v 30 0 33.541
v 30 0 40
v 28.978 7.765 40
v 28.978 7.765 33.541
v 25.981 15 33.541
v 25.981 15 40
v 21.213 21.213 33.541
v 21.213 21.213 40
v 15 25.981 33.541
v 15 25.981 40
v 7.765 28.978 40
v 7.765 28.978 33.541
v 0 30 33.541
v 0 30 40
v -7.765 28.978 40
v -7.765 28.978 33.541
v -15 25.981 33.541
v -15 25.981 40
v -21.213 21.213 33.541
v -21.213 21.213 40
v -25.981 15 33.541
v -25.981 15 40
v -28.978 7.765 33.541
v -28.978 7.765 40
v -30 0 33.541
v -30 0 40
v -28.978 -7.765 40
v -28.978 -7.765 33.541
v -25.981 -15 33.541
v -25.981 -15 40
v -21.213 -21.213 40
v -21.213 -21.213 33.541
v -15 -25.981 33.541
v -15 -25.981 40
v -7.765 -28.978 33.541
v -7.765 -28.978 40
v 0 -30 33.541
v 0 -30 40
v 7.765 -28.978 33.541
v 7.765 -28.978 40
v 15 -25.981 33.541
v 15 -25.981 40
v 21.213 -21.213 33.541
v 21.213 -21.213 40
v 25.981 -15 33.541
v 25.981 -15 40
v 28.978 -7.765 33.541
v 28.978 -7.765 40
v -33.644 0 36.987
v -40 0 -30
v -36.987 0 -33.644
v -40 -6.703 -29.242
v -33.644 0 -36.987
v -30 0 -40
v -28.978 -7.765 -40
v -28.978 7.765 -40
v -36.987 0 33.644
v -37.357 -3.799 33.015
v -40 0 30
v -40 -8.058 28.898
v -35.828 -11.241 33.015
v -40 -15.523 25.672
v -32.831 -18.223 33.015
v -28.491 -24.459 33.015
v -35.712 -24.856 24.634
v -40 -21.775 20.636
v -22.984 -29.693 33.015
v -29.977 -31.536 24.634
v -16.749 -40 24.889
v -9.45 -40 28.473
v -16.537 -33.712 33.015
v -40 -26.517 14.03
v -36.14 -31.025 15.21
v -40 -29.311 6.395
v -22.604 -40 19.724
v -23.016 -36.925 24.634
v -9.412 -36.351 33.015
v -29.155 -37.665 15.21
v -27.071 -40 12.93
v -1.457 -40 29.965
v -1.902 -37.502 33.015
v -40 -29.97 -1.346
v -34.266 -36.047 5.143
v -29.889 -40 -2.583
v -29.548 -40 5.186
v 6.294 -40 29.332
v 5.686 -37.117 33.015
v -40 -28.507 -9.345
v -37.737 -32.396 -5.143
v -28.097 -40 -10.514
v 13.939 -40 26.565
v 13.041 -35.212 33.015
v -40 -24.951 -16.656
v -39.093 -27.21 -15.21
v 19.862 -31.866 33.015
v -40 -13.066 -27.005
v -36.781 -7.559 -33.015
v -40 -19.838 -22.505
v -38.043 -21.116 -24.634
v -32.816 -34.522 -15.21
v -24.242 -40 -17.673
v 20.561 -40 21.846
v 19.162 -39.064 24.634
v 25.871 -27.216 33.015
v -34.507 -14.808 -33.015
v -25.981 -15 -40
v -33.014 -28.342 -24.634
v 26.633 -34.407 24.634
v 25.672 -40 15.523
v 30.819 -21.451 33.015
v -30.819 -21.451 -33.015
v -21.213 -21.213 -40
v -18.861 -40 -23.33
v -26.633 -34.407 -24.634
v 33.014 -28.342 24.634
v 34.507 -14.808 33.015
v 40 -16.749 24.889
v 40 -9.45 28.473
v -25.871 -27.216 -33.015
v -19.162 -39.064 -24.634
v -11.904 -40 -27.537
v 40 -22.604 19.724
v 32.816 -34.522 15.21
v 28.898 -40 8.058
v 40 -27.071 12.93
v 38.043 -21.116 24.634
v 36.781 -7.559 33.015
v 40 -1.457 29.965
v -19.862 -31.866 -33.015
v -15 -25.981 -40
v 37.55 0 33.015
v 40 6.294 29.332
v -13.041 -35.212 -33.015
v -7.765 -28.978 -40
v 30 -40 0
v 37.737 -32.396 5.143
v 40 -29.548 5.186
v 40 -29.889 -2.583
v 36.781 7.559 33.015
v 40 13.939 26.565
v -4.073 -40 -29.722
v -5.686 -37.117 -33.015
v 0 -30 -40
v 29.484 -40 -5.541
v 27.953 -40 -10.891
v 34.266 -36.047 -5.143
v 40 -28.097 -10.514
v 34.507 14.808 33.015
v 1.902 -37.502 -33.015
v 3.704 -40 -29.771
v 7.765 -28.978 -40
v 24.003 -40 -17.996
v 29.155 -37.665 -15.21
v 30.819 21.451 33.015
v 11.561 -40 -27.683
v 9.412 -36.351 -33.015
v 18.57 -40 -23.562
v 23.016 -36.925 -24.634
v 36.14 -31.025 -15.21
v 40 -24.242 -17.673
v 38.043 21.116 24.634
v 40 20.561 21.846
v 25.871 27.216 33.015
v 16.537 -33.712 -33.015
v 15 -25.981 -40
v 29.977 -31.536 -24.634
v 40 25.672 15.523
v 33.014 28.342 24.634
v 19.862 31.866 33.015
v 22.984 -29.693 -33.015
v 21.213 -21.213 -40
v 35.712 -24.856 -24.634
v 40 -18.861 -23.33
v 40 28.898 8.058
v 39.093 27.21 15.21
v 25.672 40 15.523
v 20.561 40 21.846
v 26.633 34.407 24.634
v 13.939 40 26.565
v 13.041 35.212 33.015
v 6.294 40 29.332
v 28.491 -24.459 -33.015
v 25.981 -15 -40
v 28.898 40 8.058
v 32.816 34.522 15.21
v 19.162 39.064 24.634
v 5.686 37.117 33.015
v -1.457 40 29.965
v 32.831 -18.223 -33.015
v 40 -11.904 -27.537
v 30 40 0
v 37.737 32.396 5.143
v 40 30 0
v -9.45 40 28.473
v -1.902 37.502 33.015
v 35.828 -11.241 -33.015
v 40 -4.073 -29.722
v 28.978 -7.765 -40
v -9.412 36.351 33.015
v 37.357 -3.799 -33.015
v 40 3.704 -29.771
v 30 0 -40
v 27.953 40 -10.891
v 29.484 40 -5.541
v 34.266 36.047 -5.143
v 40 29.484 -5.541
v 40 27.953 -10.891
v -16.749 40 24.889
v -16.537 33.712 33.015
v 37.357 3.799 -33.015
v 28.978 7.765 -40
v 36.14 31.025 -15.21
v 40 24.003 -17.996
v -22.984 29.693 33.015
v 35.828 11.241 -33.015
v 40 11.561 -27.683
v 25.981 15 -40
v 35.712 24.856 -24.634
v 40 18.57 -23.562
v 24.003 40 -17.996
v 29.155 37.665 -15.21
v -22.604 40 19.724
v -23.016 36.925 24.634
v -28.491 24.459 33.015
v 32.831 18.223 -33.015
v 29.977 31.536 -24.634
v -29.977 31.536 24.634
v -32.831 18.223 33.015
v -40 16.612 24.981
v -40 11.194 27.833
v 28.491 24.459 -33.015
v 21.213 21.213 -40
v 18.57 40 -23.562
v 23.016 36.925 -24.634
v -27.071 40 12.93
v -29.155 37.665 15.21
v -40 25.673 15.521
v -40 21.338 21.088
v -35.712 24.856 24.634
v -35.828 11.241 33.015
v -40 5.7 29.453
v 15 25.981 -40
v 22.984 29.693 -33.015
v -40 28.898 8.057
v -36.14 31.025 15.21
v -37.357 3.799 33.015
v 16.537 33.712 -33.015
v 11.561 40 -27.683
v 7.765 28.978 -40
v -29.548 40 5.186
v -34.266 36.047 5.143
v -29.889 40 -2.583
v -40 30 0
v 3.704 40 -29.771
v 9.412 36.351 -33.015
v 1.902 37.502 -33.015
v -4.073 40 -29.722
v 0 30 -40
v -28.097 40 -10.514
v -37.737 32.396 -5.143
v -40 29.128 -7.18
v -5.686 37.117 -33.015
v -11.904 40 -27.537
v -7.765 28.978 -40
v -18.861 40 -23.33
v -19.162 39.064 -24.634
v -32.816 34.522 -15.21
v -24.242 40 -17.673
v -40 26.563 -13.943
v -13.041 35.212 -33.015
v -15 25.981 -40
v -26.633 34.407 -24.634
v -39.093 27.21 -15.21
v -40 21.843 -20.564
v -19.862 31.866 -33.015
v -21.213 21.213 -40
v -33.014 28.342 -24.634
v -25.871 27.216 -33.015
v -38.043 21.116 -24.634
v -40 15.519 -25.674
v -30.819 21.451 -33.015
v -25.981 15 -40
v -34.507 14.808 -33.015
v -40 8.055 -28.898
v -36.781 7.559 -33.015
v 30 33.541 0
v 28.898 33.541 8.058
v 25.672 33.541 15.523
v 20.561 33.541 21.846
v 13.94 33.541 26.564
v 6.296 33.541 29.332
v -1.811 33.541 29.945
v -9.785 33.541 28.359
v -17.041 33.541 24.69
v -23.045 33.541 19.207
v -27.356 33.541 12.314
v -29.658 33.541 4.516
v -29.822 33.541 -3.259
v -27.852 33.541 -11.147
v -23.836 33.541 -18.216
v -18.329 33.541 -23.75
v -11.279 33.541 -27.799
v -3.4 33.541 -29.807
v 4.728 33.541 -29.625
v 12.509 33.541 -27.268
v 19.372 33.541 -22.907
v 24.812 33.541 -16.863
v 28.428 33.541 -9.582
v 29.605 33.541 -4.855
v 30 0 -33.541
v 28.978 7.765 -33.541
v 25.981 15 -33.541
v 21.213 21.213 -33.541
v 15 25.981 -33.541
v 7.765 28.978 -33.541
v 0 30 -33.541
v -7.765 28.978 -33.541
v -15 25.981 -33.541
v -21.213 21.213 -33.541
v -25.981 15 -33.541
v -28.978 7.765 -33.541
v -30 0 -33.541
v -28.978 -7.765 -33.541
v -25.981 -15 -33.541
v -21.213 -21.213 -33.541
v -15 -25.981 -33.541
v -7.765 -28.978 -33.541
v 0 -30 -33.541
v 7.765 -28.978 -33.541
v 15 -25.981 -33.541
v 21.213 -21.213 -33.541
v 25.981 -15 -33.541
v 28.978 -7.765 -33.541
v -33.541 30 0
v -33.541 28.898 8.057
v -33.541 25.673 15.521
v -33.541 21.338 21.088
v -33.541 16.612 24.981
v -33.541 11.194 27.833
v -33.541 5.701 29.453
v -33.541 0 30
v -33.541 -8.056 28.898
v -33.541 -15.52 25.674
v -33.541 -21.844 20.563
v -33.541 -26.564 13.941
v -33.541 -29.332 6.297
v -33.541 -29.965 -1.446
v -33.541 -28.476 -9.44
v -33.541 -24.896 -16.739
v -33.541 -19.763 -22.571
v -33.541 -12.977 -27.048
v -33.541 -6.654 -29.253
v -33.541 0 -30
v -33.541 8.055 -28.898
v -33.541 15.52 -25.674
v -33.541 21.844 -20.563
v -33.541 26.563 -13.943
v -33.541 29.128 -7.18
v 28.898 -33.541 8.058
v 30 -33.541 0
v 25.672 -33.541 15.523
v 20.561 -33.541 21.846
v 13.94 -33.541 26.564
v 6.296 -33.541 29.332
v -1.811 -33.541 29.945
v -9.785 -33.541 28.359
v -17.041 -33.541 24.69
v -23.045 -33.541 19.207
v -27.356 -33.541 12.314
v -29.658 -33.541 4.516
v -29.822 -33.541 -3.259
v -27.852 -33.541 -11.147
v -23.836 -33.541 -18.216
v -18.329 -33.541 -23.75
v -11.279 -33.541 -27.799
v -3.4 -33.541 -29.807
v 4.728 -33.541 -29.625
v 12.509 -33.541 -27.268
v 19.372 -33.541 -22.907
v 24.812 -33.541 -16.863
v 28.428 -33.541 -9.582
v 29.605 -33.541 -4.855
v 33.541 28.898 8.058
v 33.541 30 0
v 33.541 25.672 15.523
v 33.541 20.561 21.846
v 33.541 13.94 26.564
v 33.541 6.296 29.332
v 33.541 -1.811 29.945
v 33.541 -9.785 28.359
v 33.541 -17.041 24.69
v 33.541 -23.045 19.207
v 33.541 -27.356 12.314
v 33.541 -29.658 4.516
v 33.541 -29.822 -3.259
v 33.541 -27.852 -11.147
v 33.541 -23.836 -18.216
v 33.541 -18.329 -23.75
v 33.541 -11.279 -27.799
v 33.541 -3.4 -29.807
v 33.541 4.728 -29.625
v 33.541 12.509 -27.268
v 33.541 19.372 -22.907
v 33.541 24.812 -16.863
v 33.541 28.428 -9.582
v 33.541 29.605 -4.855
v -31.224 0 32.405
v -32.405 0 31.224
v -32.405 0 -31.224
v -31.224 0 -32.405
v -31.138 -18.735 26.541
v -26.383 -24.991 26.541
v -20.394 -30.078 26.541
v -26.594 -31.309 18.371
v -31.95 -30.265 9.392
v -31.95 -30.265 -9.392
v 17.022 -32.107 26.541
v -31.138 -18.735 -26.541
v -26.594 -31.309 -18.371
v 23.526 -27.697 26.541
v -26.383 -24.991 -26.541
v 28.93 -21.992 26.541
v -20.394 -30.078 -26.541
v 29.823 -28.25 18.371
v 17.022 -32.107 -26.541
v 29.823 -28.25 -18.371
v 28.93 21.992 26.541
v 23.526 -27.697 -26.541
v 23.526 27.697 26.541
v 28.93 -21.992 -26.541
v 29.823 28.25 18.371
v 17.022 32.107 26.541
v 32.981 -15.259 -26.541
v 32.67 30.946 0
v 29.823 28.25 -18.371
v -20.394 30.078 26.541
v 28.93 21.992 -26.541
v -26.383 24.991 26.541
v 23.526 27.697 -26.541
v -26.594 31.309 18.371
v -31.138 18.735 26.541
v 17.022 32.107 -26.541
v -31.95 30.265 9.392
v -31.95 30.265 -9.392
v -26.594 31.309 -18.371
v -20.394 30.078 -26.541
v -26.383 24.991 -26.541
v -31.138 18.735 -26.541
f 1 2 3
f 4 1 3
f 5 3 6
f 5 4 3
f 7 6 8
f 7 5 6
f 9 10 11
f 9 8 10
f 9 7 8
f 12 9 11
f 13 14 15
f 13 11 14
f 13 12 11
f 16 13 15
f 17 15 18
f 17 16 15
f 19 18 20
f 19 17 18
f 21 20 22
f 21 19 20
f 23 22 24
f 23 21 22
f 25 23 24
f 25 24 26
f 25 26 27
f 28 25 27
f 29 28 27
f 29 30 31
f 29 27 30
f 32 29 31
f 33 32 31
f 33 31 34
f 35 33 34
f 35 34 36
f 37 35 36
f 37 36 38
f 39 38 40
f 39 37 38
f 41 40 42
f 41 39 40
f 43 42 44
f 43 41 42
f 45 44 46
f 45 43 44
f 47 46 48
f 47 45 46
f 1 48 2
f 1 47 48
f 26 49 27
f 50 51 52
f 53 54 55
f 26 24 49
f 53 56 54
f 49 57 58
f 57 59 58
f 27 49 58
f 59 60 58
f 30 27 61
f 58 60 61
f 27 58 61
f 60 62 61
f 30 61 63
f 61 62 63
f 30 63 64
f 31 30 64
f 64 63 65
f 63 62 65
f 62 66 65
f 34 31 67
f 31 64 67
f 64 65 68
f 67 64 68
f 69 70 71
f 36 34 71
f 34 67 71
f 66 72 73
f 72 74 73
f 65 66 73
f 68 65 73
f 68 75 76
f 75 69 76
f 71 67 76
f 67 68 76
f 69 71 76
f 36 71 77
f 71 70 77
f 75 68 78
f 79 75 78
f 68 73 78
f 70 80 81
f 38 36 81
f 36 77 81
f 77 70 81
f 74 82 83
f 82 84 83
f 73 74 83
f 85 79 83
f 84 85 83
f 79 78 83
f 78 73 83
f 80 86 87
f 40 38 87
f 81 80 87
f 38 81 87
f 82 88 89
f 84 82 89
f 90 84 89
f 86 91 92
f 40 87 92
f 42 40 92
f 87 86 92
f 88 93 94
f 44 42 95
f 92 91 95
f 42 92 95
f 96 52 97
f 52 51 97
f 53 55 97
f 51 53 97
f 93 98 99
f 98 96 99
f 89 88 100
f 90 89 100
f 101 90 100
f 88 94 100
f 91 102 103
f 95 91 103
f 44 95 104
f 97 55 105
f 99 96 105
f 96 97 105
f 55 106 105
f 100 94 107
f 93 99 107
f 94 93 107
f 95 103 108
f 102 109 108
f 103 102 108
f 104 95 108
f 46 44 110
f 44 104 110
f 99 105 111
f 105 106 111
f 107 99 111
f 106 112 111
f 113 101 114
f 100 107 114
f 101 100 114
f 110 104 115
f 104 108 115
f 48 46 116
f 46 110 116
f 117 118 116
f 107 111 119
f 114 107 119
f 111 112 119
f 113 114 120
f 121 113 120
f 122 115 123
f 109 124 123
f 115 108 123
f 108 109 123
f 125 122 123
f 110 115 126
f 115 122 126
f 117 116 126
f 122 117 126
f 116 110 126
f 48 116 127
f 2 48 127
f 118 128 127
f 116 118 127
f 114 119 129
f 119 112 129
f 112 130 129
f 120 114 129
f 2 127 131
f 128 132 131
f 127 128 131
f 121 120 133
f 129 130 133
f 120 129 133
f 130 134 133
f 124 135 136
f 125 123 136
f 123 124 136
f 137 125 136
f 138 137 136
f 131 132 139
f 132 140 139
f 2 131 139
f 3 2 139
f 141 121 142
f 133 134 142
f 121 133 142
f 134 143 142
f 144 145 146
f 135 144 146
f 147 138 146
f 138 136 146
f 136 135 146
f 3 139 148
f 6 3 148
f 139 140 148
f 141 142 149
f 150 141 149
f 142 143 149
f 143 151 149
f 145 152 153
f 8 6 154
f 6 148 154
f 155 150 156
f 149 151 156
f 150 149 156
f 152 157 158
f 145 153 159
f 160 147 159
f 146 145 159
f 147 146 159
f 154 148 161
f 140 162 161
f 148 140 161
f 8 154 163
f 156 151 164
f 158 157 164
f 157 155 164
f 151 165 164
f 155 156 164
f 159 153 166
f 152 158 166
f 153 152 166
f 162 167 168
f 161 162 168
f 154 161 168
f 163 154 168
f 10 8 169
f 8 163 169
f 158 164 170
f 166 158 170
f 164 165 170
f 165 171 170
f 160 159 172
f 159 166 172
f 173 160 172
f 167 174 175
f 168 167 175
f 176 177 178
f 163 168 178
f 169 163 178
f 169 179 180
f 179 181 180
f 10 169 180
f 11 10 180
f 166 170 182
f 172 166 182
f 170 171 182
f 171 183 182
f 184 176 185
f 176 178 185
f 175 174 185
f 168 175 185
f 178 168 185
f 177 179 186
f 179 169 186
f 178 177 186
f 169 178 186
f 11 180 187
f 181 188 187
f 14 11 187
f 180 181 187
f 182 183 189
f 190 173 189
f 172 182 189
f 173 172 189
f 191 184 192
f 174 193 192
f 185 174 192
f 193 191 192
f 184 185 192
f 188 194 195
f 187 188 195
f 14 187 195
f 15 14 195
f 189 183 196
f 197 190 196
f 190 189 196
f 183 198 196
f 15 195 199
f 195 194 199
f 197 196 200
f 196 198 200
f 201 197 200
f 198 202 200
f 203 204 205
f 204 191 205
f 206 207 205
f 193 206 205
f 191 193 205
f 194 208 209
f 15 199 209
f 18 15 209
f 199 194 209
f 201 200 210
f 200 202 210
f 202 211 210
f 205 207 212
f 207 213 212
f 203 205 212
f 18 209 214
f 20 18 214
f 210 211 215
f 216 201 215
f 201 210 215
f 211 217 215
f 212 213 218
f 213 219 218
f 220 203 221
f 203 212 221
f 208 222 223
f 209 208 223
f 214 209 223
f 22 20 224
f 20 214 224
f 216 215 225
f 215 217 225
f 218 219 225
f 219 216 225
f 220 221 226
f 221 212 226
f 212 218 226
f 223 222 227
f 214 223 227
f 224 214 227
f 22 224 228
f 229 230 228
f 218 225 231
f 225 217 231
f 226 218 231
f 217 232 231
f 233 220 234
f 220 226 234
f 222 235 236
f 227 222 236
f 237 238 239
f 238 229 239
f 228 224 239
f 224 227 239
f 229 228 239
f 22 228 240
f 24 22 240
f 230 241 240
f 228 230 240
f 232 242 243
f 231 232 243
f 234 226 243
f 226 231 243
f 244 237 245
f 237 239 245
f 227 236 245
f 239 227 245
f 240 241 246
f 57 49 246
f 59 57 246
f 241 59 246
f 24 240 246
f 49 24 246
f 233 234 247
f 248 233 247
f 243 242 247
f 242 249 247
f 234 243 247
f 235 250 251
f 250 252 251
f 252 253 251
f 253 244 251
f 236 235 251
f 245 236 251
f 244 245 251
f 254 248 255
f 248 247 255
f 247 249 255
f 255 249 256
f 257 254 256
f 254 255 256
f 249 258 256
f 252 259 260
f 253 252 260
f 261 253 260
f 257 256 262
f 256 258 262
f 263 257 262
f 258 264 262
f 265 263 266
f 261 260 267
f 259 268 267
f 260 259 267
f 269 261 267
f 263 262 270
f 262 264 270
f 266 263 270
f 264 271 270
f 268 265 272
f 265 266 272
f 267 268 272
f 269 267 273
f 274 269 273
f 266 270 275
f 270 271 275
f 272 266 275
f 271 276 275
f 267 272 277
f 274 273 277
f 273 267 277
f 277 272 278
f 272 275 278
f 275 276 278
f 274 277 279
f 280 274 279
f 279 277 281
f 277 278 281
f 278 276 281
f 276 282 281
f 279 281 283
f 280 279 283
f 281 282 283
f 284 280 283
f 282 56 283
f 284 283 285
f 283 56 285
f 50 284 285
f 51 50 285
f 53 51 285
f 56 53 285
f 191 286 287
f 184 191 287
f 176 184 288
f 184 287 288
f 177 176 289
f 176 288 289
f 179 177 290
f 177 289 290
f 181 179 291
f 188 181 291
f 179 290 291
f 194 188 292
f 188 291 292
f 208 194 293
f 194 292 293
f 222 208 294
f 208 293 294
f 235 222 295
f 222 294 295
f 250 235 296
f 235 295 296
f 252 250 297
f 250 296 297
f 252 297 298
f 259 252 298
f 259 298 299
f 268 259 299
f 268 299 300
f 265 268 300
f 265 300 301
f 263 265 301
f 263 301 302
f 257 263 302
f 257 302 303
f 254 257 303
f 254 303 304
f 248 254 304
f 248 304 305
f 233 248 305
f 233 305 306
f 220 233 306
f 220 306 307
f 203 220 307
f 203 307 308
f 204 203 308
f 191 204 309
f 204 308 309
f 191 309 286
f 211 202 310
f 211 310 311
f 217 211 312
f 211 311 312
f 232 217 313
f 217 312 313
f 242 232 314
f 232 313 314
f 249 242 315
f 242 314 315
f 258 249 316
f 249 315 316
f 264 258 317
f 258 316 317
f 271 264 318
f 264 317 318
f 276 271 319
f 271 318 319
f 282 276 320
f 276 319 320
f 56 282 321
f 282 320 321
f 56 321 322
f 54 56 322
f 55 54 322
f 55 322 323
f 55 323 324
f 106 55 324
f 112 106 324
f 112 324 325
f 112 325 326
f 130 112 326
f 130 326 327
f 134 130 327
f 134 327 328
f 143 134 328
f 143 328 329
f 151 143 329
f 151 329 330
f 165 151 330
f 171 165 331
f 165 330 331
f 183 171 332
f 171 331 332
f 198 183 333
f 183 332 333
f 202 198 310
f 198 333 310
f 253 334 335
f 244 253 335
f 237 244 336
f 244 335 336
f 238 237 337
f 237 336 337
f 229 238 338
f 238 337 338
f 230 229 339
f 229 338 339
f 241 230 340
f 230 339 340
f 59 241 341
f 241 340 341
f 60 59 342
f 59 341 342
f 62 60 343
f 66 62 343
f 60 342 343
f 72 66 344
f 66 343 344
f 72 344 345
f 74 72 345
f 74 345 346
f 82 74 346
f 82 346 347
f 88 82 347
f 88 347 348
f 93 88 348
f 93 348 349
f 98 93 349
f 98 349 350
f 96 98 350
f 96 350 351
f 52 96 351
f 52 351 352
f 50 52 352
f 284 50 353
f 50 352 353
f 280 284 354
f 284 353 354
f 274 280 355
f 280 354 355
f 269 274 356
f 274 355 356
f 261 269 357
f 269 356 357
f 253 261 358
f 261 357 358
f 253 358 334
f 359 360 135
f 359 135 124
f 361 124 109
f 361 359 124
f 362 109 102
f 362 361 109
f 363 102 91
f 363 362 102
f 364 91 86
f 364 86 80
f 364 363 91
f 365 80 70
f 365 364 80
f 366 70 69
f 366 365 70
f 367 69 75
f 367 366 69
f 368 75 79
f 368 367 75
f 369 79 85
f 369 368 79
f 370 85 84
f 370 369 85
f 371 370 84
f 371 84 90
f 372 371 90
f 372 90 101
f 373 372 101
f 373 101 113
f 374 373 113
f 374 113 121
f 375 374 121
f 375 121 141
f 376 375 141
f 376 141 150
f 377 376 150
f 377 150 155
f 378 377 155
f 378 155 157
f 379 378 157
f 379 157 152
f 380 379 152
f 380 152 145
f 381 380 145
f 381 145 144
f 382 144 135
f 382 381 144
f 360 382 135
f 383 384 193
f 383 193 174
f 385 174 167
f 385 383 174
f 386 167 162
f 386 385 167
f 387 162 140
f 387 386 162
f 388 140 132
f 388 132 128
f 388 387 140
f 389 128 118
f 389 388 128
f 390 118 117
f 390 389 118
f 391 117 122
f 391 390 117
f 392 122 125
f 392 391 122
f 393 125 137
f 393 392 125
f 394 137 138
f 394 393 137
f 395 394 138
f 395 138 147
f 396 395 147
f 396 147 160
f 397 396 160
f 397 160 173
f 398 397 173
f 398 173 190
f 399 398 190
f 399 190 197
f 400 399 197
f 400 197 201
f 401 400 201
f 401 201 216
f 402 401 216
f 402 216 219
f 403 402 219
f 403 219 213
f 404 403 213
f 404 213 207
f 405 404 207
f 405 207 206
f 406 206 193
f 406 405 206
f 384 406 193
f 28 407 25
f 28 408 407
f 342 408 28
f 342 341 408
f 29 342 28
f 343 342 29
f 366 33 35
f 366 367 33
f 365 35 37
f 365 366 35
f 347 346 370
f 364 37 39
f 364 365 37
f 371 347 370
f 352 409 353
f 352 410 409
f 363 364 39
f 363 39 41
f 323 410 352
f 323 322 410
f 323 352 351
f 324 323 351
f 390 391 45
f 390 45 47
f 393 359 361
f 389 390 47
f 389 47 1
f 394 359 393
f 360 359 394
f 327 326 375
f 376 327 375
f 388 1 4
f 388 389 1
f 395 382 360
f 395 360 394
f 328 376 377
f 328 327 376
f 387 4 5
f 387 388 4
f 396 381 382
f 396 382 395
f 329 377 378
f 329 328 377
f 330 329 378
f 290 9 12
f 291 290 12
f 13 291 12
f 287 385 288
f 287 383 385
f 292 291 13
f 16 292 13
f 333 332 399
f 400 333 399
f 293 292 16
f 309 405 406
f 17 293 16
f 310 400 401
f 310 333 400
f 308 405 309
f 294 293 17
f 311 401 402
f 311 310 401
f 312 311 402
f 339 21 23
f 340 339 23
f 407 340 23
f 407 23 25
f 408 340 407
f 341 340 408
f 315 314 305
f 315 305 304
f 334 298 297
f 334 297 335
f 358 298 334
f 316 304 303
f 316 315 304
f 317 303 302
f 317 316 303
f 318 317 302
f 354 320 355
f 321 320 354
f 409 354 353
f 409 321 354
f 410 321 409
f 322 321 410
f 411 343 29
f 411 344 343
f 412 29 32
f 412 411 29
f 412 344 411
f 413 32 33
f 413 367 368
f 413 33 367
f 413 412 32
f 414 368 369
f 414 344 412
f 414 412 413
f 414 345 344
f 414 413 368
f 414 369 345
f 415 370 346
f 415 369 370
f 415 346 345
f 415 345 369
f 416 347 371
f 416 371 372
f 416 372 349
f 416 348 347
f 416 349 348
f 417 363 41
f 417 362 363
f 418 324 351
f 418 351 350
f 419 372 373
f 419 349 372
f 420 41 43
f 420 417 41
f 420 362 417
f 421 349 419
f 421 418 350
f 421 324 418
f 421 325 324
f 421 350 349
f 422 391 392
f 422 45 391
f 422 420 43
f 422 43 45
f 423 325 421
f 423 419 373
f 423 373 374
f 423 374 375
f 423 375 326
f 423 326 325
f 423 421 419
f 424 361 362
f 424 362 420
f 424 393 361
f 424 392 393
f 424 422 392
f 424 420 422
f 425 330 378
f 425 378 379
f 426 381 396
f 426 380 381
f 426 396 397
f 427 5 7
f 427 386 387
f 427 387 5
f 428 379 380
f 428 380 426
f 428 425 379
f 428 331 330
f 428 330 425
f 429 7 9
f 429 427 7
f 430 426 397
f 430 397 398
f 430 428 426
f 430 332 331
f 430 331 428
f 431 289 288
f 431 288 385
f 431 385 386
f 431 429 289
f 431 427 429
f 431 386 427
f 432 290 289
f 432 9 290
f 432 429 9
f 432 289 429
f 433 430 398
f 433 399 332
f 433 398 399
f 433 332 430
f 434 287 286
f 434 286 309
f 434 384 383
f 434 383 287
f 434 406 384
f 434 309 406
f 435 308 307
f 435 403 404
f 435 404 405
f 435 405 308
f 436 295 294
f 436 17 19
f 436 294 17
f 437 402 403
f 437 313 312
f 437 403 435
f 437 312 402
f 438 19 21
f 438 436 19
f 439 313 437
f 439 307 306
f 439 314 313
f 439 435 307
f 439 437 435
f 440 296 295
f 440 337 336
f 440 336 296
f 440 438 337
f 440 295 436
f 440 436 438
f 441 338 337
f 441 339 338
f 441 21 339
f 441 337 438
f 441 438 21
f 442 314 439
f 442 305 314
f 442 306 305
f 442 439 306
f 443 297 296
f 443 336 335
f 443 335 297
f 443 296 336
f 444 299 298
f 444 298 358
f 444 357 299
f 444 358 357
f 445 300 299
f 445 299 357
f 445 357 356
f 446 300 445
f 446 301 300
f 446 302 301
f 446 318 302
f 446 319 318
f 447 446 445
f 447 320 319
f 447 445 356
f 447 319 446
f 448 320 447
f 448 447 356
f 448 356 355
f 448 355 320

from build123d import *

# Parameters (mm, degrees)
F2_R          = 30
F3_DEPTH      = 50.001
F3_DEPTH_BACK = 50.001
F4_R          = 30
F5_DEPTH      = 50.001
F5_DEPTH_BACK = 50.001
F6_R          = 30
F7_DEPTH      = 50.001
F7_DEPTH_BACK = 50.001


# Not quite as in the source:
# - a feature names something its author has since deleted; it is built from what else it names


with BuildPart() as f1:
    # F0 (on Front) → F1 (revolve)
    with BuildSketch(Plane.XZ):
        with BuildLine():
            Line((0, -50), (0, 0))
            Line((0, 0), (0, 50))
            ThreePointArc((0, 50), (-50, 0), (0, -50))
        make_face()
    revolve(axis=Axis((0, 0, 25), (0, 0, 1)))

    # F2 (on Front) → F3 (cut, two sides)
    with BuildSketch(Plane.XZ) as f3_sk:
        Circle(F2_R)
    extrude(amount=-F3_DEPTH, mode=Mode.SUBTRACT)
    extrude(f3_sk.sketch, amount=F3_DEPTH_BACK, mode=Mode.SUBTRACT)

    # F4 (on Right) → F5 (cut, two sides)
    with BuildSketch(Plane.YZ) as f5_sk:
        Circle(F4_R)
    extrude(amount=-F5_DEPTH, mode=Mode.SUBTRACT)
    extrude(f5_sk.sketch, amount=F5_DEPTH_BACK, mode=Mode.SUBTRACT)

    # F6 (on Top) → F7 (cut, two sides)
    with BuildSketch(Plane.XY) as f7_sk:
        Circle(F6_R)
    extrude(amount=F7_DEPTH, mode=Mode.SUBTRACT)
    extrude(f7_sk.sketch, amount=-F7_DEPTH_BACK, mode=Mode.SUBTRACT)

    # F8 (on Front) → F9 (revolve, cut)
    with BuildSketch(Plane.XZ):
        with BuildLine():
            Line((0, -45), (0, 0))
            Line((0, 0), (0, 45))
            ThreePointArc((0, 45), (-45, 0), (0, -45))
        make_face()
    revolve(axis=Axis((0, 0, 22.5), (0, 0, 1)), mode=Mode.SUBTRACT)


solid = f1.part
